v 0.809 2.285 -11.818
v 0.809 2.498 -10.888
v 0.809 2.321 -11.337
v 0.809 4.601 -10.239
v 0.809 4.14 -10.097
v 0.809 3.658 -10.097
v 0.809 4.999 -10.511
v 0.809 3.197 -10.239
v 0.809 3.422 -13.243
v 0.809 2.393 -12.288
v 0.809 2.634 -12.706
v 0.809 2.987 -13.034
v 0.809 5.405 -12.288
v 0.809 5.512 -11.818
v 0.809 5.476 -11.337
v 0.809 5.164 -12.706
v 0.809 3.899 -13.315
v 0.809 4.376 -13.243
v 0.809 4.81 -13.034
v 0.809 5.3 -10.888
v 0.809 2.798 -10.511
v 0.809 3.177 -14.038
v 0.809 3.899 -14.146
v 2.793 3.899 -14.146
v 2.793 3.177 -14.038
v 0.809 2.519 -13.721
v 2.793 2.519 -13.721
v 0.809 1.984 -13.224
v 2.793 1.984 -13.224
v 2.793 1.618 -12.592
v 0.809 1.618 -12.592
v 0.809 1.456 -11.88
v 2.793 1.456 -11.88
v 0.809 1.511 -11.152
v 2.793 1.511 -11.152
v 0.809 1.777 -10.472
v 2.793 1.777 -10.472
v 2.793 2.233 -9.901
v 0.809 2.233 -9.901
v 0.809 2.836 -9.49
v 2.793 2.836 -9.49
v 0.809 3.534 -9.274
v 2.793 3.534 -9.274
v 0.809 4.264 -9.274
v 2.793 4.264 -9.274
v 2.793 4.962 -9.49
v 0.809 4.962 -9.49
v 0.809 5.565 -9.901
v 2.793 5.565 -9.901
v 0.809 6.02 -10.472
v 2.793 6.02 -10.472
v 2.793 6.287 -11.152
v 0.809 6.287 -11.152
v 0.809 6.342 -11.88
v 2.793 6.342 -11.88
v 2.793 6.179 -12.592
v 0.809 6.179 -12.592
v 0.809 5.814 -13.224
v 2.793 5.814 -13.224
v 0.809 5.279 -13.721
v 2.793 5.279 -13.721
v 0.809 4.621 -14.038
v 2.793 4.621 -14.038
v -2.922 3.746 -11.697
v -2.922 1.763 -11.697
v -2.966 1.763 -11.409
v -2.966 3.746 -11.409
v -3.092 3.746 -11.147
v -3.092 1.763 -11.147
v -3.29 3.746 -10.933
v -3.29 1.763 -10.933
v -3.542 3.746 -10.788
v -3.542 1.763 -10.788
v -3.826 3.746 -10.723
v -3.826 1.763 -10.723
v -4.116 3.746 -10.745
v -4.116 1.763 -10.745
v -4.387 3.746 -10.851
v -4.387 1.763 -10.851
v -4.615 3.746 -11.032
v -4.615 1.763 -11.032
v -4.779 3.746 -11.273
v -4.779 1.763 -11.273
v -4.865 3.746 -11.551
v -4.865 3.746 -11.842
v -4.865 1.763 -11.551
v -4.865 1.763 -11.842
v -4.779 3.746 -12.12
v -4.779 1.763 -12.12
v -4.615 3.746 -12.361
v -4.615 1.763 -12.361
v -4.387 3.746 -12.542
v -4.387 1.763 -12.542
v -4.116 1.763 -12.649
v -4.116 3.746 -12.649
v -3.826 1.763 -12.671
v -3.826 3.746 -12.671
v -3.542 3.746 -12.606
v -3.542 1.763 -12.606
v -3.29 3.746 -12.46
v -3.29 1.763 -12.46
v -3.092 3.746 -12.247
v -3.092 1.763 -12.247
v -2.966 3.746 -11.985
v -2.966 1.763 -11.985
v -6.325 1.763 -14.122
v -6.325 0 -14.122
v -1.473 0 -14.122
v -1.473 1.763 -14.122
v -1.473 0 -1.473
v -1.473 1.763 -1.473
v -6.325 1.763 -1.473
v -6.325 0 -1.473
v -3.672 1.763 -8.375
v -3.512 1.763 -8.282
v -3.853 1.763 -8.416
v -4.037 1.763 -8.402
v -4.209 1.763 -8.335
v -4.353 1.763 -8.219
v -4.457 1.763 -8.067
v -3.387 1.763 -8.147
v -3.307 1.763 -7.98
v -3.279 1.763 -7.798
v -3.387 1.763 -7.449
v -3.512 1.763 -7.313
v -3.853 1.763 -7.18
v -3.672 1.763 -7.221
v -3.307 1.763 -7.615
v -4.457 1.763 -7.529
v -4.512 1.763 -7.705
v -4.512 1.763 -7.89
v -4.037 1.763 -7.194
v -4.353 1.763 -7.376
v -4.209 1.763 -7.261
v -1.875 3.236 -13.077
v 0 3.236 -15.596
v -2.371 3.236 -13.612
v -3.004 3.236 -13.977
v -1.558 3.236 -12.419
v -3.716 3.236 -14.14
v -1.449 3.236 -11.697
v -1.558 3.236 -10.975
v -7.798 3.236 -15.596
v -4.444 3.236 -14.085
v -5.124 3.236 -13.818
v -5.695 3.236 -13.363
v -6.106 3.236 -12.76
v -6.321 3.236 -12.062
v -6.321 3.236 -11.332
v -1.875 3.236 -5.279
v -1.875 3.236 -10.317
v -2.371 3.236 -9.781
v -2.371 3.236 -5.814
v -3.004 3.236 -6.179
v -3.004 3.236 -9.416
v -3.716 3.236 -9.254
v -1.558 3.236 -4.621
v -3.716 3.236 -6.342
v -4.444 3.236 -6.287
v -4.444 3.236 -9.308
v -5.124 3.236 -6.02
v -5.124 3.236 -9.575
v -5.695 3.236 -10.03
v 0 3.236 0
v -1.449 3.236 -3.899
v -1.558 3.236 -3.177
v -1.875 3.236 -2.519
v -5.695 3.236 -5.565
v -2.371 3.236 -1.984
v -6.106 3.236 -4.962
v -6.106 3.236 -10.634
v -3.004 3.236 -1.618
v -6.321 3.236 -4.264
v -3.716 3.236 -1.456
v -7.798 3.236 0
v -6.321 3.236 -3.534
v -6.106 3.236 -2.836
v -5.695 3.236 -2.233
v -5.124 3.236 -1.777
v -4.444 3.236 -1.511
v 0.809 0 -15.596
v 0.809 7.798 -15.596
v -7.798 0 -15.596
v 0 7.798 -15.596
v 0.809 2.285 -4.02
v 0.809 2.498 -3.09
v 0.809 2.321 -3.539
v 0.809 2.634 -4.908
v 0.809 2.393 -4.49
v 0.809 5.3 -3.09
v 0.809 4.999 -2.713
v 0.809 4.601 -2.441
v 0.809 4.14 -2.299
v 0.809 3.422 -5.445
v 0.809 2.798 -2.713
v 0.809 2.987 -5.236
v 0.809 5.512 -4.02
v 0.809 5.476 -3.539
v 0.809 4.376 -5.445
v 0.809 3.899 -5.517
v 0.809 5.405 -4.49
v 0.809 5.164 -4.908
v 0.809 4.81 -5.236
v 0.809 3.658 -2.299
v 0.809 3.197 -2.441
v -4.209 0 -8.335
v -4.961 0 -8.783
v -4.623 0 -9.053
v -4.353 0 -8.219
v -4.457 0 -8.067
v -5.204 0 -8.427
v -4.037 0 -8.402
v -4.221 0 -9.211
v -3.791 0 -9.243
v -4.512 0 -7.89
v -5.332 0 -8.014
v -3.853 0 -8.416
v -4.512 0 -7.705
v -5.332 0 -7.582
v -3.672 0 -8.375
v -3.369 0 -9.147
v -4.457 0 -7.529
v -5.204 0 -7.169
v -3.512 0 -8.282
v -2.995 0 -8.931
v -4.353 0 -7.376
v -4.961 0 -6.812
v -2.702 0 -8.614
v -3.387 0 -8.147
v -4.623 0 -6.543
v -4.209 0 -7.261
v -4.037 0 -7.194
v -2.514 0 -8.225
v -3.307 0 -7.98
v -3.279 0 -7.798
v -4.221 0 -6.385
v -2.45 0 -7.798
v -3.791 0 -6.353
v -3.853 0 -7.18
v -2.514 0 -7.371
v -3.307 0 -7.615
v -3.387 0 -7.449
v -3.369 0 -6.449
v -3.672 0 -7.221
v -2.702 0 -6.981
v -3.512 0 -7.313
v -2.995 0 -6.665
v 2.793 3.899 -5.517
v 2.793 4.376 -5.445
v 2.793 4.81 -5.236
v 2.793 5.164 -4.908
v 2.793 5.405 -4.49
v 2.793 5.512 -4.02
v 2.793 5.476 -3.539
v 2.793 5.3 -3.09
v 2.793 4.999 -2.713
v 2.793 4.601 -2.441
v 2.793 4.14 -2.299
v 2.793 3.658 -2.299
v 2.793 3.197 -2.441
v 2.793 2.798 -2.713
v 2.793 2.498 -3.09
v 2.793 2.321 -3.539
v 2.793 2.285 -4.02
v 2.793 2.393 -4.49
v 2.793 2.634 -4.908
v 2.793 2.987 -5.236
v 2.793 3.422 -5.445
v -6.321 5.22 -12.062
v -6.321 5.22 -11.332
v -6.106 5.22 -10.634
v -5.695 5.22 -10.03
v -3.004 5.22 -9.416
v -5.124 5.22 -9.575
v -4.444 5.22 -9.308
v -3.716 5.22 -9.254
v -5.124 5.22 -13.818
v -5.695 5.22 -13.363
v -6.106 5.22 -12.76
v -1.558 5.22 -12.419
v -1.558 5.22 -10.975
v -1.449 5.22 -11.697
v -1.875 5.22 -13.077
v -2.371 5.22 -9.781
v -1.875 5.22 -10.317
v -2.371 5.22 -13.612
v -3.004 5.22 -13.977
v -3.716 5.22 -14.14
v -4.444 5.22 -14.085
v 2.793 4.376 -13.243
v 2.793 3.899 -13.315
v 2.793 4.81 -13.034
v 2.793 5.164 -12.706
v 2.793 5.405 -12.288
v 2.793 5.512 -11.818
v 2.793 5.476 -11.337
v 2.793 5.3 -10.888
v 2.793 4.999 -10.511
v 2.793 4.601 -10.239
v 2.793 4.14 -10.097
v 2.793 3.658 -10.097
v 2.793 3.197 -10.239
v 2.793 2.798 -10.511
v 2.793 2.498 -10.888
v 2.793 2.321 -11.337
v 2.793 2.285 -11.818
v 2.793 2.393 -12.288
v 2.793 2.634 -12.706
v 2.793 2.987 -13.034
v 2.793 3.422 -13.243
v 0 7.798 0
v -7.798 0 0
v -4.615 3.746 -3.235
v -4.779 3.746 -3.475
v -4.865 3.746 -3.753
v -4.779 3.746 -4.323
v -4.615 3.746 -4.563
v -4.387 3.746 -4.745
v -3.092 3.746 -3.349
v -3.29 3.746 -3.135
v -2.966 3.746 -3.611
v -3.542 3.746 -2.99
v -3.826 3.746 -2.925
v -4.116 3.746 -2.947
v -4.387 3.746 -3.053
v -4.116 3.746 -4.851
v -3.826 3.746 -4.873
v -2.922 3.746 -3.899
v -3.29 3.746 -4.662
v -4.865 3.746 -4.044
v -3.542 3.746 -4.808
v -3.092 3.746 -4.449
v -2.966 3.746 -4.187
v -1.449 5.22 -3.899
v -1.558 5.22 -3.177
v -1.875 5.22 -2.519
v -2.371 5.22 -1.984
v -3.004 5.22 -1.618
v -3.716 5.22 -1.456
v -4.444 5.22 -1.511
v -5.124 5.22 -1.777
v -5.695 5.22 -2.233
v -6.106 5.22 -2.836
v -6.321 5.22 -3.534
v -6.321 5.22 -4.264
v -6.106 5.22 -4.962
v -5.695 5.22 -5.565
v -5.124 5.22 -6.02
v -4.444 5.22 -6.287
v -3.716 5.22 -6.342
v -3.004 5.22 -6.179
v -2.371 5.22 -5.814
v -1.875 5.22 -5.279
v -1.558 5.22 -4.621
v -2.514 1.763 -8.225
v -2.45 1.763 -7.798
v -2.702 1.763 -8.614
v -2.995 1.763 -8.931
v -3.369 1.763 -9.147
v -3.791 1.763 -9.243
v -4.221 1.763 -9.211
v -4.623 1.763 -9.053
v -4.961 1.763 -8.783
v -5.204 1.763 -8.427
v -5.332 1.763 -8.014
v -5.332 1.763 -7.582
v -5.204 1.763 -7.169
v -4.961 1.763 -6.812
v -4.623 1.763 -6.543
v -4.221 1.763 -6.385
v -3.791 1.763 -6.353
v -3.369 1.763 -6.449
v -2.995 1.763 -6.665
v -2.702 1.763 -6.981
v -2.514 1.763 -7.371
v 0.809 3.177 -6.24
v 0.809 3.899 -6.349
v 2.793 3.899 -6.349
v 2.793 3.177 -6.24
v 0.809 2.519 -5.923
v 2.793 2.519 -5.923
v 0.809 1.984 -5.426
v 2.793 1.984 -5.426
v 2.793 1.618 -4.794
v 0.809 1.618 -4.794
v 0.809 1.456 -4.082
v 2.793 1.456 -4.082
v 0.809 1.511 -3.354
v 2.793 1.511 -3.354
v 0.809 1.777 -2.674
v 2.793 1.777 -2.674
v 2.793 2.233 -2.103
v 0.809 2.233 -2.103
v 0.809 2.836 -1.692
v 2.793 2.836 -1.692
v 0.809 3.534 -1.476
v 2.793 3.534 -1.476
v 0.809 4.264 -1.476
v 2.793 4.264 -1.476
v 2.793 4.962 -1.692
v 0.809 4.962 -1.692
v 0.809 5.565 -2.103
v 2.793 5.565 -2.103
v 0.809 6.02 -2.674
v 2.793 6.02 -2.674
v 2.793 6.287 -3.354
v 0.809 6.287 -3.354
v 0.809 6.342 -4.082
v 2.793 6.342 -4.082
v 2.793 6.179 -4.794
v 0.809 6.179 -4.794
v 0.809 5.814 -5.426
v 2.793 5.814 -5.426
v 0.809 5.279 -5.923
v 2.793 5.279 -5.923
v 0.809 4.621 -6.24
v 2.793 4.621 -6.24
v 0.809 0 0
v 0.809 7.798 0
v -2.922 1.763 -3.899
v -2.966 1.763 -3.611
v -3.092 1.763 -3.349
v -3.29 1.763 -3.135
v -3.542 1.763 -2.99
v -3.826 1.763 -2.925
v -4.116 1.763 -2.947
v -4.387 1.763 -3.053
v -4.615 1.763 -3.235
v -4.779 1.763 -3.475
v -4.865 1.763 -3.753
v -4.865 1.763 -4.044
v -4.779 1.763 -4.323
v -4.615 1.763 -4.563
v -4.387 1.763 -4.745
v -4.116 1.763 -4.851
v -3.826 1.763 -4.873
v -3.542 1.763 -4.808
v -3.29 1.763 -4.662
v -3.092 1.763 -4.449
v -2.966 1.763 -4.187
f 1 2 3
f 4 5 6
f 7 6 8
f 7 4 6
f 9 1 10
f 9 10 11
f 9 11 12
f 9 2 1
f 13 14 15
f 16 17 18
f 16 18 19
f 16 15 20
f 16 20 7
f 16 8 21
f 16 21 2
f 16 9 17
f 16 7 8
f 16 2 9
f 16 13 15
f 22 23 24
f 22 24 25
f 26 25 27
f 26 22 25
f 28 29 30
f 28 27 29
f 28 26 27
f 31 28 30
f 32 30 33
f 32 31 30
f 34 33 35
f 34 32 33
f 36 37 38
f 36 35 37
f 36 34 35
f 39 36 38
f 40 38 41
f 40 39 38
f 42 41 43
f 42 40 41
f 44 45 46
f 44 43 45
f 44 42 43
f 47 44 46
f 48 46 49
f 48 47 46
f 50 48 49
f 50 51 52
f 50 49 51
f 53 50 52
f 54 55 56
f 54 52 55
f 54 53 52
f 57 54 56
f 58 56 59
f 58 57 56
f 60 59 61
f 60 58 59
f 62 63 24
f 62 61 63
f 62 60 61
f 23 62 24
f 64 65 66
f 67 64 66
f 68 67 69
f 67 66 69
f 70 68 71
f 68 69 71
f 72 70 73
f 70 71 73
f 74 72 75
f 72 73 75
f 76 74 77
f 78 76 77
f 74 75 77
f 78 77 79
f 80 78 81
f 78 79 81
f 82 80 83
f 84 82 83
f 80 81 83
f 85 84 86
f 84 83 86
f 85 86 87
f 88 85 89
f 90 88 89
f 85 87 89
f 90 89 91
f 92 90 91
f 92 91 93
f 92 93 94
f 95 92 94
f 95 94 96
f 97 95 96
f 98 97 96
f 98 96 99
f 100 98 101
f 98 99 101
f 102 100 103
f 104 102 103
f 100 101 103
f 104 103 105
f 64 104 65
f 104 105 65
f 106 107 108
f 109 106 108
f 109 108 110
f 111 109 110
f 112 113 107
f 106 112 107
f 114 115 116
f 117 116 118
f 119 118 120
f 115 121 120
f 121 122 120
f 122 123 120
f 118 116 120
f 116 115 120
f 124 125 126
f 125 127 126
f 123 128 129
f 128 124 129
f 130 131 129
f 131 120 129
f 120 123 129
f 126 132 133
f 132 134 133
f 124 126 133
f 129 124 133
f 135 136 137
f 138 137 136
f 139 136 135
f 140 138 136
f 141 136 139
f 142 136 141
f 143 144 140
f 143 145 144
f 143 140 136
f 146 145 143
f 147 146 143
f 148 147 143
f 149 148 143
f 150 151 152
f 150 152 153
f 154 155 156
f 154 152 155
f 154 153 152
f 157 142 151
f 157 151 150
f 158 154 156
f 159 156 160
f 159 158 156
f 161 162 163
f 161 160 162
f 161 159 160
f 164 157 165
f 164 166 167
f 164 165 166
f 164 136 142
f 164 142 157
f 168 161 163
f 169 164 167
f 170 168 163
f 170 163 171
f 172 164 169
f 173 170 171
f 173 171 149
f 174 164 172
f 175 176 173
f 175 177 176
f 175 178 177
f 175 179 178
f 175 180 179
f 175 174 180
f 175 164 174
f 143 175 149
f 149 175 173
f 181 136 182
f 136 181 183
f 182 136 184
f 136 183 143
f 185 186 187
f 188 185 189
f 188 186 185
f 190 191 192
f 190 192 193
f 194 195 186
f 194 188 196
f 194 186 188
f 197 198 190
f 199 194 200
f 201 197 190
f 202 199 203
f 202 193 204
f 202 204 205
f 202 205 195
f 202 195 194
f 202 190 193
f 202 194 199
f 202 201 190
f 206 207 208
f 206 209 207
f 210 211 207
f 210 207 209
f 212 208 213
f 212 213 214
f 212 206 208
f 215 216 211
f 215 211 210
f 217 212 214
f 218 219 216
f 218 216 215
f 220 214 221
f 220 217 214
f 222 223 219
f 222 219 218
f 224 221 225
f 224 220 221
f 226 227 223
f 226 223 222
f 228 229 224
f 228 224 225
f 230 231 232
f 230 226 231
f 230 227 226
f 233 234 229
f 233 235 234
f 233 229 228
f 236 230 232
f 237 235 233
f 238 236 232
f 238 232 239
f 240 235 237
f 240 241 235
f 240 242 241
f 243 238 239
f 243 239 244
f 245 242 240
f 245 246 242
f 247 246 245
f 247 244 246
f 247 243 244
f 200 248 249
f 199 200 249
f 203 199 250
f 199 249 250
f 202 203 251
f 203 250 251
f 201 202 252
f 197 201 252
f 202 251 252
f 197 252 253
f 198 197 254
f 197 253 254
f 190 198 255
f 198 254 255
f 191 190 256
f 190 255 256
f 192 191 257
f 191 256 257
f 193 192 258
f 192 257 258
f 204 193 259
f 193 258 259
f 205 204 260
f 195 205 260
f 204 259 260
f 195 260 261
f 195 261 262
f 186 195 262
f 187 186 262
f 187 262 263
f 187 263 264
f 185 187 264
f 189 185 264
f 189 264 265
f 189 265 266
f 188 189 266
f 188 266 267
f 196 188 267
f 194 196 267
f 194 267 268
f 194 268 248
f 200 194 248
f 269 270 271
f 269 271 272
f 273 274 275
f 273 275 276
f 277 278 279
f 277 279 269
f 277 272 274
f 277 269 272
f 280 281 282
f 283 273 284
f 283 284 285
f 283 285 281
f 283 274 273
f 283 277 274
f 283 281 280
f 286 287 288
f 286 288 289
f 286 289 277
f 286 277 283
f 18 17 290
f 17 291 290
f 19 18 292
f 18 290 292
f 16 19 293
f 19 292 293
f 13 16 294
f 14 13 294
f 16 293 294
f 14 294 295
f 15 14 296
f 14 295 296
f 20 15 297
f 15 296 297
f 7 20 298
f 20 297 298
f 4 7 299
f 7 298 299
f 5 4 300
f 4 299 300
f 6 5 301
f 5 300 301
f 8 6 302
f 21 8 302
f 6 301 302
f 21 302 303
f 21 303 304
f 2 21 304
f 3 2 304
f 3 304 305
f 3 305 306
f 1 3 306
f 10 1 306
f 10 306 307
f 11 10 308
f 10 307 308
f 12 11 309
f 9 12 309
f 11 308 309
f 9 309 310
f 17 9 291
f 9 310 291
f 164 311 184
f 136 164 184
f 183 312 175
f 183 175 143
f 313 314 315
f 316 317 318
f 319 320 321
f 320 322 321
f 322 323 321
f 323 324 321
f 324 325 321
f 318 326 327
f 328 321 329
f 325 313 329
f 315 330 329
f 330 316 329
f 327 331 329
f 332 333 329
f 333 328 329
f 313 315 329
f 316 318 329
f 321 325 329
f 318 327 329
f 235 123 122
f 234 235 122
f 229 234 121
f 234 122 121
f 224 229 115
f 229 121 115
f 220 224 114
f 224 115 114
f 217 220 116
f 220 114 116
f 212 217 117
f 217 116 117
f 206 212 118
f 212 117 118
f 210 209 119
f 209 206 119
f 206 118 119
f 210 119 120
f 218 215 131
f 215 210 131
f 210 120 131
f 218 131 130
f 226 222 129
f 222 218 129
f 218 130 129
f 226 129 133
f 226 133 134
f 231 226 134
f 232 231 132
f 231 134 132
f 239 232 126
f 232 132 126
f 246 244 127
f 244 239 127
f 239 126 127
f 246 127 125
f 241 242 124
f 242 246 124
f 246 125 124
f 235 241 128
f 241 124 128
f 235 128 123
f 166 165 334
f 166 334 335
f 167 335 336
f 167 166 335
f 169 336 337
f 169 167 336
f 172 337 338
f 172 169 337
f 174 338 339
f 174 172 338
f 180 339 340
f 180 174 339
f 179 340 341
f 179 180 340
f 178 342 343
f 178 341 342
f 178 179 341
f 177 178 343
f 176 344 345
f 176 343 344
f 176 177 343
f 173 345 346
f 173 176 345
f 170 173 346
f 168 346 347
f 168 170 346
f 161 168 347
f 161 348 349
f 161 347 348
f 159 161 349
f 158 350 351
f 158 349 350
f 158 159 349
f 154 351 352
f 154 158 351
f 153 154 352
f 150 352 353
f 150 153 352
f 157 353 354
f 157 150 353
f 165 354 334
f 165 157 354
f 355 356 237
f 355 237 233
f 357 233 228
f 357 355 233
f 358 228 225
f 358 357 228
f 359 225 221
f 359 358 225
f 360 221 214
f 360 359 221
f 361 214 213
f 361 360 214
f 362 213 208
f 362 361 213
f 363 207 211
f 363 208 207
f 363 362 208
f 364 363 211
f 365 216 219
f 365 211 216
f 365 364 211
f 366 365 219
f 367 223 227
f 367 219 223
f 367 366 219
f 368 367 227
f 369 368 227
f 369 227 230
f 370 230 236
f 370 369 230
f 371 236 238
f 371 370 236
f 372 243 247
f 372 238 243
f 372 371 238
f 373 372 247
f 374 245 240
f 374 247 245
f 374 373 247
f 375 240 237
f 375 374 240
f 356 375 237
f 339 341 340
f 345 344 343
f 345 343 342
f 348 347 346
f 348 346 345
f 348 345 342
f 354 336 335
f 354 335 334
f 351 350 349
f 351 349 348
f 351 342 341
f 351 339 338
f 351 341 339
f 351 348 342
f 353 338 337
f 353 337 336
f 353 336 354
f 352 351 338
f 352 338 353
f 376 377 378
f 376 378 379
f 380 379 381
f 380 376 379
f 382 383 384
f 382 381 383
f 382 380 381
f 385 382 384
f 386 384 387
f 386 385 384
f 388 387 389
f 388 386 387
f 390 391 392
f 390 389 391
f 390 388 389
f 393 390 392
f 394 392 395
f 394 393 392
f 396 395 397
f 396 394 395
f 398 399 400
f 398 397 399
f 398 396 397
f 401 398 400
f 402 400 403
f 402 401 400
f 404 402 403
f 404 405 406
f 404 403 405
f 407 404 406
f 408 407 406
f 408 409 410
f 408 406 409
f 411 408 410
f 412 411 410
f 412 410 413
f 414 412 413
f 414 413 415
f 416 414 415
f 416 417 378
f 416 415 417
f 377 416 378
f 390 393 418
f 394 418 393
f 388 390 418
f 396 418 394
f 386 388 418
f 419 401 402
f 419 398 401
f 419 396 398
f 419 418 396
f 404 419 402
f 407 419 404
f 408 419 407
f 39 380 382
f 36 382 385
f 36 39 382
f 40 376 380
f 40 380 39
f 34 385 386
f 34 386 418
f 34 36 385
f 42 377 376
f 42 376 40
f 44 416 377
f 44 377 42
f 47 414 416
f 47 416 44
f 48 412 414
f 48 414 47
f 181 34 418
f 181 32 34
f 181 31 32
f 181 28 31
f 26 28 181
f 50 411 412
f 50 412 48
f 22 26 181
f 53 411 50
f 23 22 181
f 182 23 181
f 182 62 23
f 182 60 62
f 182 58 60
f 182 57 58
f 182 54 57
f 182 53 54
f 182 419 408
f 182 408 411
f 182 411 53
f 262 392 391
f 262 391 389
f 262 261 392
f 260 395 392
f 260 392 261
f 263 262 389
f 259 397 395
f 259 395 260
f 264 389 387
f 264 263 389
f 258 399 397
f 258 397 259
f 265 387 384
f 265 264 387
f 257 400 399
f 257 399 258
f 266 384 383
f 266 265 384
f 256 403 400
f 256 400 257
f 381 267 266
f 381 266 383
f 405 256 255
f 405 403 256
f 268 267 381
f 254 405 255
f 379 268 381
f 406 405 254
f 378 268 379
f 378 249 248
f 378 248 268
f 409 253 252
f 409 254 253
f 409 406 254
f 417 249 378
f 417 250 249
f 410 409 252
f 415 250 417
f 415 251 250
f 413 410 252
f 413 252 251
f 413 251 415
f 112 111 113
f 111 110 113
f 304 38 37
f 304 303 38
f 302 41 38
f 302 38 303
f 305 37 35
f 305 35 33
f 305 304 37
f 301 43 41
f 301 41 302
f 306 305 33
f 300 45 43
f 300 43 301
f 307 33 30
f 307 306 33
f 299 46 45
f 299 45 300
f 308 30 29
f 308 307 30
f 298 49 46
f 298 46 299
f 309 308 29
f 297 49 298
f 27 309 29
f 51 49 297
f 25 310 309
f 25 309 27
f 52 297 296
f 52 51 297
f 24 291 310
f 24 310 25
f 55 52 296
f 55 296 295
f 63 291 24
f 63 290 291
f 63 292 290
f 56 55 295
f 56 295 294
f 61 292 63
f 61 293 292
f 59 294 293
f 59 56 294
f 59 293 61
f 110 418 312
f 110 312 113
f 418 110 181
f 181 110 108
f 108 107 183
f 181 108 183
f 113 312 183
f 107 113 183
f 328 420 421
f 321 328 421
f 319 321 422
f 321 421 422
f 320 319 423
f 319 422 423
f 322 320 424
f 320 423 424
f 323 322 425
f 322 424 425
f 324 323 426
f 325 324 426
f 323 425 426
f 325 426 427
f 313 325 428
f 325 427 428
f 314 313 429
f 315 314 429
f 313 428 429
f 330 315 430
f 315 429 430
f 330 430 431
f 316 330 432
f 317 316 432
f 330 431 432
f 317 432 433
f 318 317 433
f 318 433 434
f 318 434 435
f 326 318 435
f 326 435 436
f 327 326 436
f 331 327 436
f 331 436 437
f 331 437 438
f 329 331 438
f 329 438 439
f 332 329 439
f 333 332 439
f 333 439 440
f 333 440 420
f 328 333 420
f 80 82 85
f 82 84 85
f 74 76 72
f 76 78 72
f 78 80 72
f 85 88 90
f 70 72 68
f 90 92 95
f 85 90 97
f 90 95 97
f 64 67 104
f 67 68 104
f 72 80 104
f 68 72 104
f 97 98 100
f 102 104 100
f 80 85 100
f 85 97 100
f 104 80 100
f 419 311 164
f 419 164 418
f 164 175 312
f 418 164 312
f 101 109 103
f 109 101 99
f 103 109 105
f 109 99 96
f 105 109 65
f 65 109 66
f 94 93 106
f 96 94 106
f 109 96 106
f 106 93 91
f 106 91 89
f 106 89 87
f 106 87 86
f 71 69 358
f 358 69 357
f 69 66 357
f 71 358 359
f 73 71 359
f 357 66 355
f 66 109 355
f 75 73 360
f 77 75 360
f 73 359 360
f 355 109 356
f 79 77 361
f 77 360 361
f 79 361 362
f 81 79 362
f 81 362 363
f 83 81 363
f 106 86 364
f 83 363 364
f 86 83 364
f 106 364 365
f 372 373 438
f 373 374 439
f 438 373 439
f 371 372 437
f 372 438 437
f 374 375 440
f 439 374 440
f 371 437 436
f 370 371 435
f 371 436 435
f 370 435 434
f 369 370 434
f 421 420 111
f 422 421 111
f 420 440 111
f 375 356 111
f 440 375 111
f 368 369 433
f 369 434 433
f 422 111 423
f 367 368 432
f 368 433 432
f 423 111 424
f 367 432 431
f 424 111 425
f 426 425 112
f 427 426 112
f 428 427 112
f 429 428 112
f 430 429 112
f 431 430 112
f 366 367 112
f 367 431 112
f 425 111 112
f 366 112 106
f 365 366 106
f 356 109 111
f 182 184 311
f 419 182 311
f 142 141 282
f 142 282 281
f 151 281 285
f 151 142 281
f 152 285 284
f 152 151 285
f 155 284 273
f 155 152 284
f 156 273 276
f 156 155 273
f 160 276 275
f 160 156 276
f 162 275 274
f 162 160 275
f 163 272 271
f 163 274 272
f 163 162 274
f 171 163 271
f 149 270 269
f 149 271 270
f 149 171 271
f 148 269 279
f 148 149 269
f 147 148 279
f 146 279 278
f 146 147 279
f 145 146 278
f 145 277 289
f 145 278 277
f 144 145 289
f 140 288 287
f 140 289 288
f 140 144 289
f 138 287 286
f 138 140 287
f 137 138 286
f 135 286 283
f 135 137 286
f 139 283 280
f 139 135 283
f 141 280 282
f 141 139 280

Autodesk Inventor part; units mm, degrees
ref_plane "YZ Plane" through (0, 0, 0) normal (1, 0, 0) x (0, 1, 0)
ref_plane "XZ Plane" through (0, 0, 0) normal (0, 1, 0) x (-1, 0, 0)
ref_plane "XY Plane" through (0, 0, 0) normal (0, 0, 1) x (1, 0, 0)
sketch "Sketch1" plane through (0, 0, 0) normal (0, 1, 0) x (-1, 0, 0)
  line L0 (0, 0) -> (7.7978, 0)
  line L1 (7.7978, 0) -> (7.7978, -15.5956)
  line L2 (7.7978, -15.5956) -> (0, -15.5956)
  line L3 (0, -15.5956) -> (0, 0)
  dimension "d0" = 7.7978
  dimension "d8" = 15.5956
extrude "Extrusion1" add sketch "Sketch1" along normal blind 3.236
sketch "Sketch2" plane through (0, 3.236, 0) normal (0, 1, 0) x (1, 0, 0)
  line L0 (0, 0) -> (0, 15.5956) construction
  line L1 (0, 0) -> (-3.8989, 0) construction
  line L2 (-3.8989, 0) -> (-3.8989, 3.8989) construction
  line L3 (-3.8989, 3.8989) -> (0, 3.8989) construction
  line L4 (0, 3.8989) -> (0, 0) construction
  circle A0 centre (-3.8989, 3.8989) radius 2.4498
  dimension "d11" = 3.8989
  dimension "d12" = 3.8989
  dimension "d13" = 4.8997
extrude "Extrusion2" add sketch "Sketch2" along normal blind 1.9837
pattern_linear "Rectangular Pattern1" count 2 spacing 7.7978 along (0, 0, -1) of "Extrusion2"
shell "Shell1" thickness 1.4732 removed faces 1 at (-2.5993, 0, -5.1985)
sketch "Sketch3" plane through (-6.3246, 1.7628, -1.4732) normal (0, -1, 0) x (1, 0, 0)
  circle A0 centre (2.4257, -2.4257) radius 2.4498 construction
  circle A1 centre (2.4257, -10.2235) radius 2.4498 construction
  circle A2 centre (2.4257, -2.4257) radius 0.9766 construction
  line L0 (2.4257, -2.4257) -> (2.4257, -10.2235) construction
  circle A3 centre (2.4257, -6.3246) radius 1.4491
  circle A4 centre (2.4257, -6.3246) radius 0.6198
  point P0 (6.3246, 1.4732)
  dimension "d20" = 1.2395
extrude "Extrusion3" add sketch "Sketch3" along normal up to surface (1.7628 mm away)
sketch "Sketch4" plane through (0, 0, 0) normal (1, 0, 0) x (0, 0, -1)
  line L0 (0, 0) -> (15.5956, 0)
  line L1 (15.5956, 0) -> (15.5956, 7.7978)
  line L2 (15.5956, 7.7978) -> (0, 7.7978)
  line L3 (0, 7.7978) -> (0, 0)
  dimension "d23" = 15.5956
  dimension "d24" = 7.7978
extrude "Extrusion4" add sketch "Sketch4" along normal blind 0.809
sketch "Sketch5" plane through (0.809, 0, 0) normal (1, 0, 0) x (0, 0, -1)
  line L0 (0, 0) -> (15.5956, 0) construction
  line L1 (0, 0) -> (3.8989, 0) construction
  line L2 (3.8989, 0) -> (3.8989, 3.8989) construction
  line L3 (3.8989, 3.8989) -> (0, 3.8989) construction
  line L4 (0, 3.8989) -> (0, 0) construction
  circle A0 centre (3.8989, 3.8989) radius 2.4498
  dimension "d27" = 3.8989
  dimension "d28" = 3.8989
  dimension "d29" = 4.8997
extrude "Extrusion5" add sketch "Sketch5" along normal blind 1.9837
sketch "Sketch6" plane through (2.7927, 3.8989, -3.8989) normal (1, 0, 0) x (0, 0, -1)
  circle A0 centre (0, 0) radius 2.4498 construction
  circle A1 centre (0, 0) radius 1.618
  point P0 (-3.8989, -3.8989)
  dimension "d32" = 3.236
extrude "Extrusion6" cut sketch "Sketch6" against normal blind 1.9837
pattern_linear "Rectangular Pattern2" count 2 spacing 7.7978 along (0, 0, -1) of "Extrusion6", "Extrusion5"
equation "\"d0\" = d1"
equation "\"d8\" = 2 * d1"
equation "\"d9\" = d2"
equation "\"d11\" = 0.5 * d1"
equation "\"d12\" = 0.5 * d1"
equation "\"d13\" = d4"
equation "\"d14\" = d5"
equation "\"d18\" = d1"
equation "\"d19\" = d6"
equation "\"d20\" = d7"
equation "\"d21\" = d5"
equation "\"d23\" = 2 * d1"
equation "\"d24\" = d1"
equation "\"d25\" = 0.25 * d2"
equation "\"d27\" = 0.5 * d1"
equation "\"d28\" = 0.5 * d1"
equation "\"d29\" = d4"
equation "\"d30\" = d5"
equation "\"d32\" = d2"
equation "\"d33\" = d5"
equation "\"d37\" = d1"
equation "\"d1\" = 7.7978"
equation "\"d2\" = 3.23596"
equation "\"d3\" = 9.60882"
equation "\"d4\" = 4.89966"
equation "\"d5\" = 1.98374"
equation "\"d6\" = 1.4732"
equation "\"d7\" = 1.23952"
properties part number "Two Sided Piece" material "ABS Plastic"
